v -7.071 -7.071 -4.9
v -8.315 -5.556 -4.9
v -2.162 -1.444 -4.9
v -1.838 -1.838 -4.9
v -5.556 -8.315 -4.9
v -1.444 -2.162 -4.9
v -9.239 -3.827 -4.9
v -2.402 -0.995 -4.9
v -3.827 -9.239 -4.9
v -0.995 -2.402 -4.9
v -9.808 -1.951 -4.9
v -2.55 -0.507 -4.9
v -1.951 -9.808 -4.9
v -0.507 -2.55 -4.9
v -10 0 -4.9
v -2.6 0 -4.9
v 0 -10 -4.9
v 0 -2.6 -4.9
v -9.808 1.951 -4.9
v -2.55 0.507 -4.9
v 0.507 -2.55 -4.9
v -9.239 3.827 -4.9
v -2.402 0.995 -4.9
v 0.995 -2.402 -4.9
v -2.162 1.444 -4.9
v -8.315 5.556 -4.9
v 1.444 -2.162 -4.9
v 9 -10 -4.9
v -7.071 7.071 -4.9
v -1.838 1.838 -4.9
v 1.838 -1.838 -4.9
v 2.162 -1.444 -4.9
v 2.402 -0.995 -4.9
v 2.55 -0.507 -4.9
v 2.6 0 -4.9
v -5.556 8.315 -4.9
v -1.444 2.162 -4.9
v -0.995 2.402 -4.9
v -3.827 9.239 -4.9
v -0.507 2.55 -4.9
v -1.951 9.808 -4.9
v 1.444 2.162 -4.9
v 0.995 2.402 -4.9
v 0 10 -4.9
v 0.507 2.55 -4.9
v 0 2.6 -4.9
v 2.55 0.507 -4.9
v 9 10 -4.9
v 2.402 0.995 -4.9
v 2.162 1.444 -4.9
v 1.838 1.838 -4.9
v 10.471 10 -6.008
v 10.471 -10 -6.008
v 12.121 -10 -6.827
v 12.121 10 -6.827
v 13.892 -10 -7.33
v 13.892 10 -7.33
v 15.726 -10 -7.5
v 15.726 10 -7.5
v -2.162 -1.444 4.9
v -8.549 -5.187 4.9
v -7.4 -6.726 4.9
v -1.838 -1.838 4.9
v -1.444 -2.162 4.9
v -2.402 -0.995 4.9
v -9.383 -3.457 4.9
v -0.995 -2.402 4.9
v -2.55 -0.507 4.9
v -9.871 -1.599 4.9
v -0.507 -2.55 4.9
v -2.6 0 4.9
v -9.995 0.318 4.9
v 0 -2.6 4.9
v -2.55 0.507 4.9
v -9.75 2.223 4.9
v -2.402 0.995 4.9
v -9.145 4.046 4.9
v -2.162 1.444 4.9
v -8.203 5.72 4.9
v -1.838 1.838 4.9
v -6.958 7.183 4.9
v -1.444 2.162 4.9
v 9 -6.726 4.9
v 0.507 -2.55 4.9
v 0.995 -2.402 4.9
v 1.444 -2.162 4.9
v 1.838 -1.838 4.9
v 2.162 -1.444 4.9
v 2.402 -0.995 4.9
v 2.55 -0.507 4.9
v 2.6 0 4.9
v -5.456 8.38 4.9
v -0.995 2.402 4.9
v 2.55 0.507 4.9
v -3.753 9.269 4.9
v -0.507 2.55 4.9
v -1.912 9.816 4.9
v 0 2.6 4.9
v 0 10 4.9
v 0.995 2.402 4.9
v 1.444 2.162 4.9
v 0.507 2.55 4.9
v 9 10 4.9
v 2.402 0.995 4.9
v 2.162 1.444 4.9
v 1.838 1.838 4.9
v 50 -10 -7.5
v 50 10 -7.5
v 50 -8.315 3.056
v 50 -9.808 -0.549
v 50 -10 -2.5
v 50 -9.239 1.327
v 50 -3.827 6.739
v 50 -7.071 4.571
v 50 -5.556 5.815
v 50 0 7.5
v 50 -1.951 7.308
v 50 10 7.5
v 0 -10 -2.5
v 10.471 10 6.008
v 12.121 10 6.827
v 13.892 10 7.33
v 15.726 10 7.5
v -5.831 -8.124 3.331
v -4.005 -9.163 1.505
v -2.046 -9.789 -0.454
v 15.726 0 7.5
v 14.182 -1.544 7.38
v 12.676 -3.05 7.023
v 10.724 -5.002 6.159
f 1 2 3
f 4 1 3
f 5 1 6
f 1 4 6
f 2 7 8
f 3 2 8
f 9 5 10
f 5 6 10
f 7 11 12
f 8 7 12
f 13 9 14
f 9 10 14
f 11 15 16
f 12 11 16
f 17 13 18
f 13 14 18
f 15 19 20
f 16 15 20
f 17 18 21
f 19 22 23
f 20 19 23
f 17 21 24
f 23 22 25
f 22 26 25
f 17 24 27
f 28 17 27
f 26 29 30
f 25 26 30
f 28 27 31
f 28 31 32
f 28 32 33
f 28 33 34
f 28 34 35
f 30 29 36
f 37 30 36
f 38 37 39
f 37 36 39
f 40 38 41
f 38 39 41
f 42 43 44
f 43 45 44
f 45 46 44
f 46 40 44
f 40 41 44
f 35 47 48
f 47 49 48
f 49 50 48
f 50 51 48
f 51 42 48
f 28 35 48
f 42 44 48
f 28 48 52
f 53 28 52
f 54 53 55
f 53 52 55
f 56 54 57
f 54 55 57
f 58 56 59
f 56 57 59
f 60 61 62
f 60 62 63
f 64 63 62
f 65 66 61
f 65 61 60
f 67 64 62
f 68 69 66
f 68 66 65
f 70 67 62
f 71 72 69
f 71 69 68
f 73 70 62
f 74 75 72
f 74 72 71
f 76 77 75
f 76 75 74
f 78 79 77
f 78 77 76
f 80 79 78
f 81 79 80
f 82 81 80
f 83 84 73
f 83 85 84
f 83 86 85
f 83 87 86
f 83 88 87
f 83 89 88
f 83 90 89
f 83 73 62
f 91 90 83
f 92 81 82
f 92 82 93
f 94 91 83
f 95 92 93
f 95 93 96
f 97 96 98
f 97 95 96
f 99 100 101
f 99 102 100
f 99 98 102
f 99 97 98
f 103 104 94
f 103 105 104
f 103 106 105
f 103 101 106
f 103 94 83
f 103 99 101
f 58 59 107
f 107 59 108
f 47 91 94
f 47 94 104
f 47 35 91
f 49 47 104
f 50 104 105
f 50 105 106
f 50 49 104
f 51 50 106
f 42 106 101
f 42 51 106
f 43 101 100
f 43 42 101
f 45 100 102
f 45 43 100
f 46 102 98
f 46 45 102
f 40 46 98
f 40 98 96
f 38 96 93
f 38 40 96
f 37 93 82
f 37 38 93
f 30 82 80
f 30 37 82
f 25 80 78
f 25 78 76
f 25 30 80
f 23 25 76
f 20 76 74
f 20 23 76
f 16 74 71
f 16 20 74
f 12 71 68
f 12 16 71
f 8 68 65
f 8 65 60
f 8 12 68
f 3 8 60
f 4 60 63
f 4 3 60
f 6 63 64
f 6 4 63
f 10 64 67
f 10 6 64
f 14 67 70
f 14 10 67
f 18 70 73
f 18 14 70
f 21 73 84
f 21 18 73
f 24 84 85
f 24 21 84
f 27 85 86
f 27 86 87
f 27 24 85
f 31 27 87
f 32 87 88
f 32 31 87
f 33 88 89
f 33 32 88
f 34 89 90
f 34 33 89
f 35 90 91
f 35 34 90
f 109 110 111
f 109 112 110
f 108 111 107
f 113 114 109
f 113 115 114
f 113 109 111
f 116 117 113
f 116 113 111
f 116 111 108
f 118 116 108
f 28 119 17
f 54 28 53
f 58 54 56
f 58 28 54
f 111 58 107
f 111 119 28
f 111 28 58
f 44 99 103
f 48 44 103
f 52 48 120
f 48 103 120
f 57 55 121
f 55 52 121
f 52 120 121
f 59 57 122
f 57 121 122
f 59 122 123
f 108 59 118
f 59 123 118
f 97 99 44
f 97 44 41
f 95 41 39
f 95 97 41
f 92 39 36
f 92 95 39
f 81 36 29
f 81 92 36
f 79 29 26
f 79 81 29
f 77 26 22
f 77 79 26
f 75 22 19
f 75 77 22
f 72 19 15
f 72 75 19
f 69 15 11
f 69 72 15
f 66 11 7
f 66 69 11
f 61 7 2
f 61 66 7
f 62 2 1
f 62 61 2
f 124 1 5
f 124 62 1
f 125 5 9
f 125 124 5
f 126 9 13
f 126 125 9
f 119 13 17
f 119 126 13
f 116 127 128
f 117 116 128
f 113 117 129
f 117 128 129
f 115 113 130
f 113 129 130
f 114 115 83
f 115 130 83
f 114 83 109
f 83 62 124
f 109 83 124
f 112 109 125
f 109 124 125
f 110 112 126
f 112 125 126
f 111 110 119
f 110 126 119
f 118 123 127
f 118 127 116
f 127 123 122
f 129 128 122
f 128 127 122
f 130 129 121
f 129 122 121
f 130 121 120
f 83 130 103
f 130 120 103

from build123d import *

# Parameters (mm, degrees)
SKETCH1_R           = 2.6
BOSS_EXTRUDE1_DEPTH = 4.9
SKETCH1_3_W         = 41
SKETCH1_3_H         = 20
BOSS_EXTRUDE2_DEPTH = 7.5
FILLET1_R           = 10


with BuildPart() as part:
    # Sketch1 → Boss-Extrude1 (new, symmetric)
    with BuildSketch(Plane.XY):
        with BuildLine():
            Line((9, 10), (0, 10))
            ThreePointArc((0, 10), (-10, 0), (0, -10))
            Line((0, -10), (9, -10))
            Line((9, -10), (9, 10))
        make_face()
        Circle(SKETCH1_R, mode=Mode.SUBTRACT)
    extrude(amount=BOSS_EXTRUDE1_DEPTH, both=True)

    # Sketch1<3> → Boss-Extrude2 (add, symmetric)
    with BuildSketch(Plane.XY):
        with Locations((29.5, 0)):
            Rectangle(SKETCH1_3_W, SKETCH1_3_H)
    extrude(amount=BOSS_EXTRUDE2_DEPTH, both=True)

    # Fillet1
    # the kernel refuses this fillet: 10 mm, written as the material it takes off along each edge
    with BuildSketch(Plane(origin=(-16, -10, 7.5), x_dir=(0, 0, -1), z_dir=(1, 0, 0))) as fillet1_piece_1:
        with BuildLine():
            CenterArc((FILLET1_R, FILLET1_R), FILLET1_R, 180, 90)
            Line((0, FILLET1_R), (-FILLET1_R * 0.02, FILLET1_R))
            Line((-FILLET1_R * 0.02, FILLET1_R), (-FILLET1_R * 0.02, -FILLET1_R * 0.02))
            Line((-FILLET1_R * 0.02, -FILLET1_R * 0.02), (FILLET1_R, -FILLET1_R * 0.02))
            Line((FILLET1_R, -FILLET1_R * 0.02), (FILLET1_R, 0))
        make_face()
    extrude(amount=91, mode=Mode.SUBTRACT)
    with BuildSketch(Plane(origin=(9, 26.815171721, -7.5), x_dir=(1, 0, 0), z_dir=(0, -1, 0))) as fillet1_piece_2:
        with BuildLine():
            CenterArc((6.726068688, 10), FILLET1_R, 227.73141557, 42.26858443)
            Line((0, 2.6), (-0.134521374, 2.452))
            ThreePointArc((-0.134521374, 2.452), (-0.2, 1.3), (-0.2, 0))
            Line((-0.2, 0), (0, -0.2))
            Line((0, -0.2), (6.726068688, -0.2))
            Line((6.726068688, -0.2), (6.726068688, 0))
        make_face()
    extrude(amount=53.630343442, mode=Mode.SUBTRACT)
    with BuildSketch(Plane(origin=(9, 26.815171721, 7.5), x_dir=(1, 0, 0), z_dir=(0, -1, 0))) as fillet1_piece_3:
        with BuildLine():
            CenterArc((6.726068688, -10), FILLET1_R, 90, 42.26858443)
            Line((0, -2.6), (-0.134521374, -2.452))
            ThreePointArc((-0.134521374, -2.452), (-0.2, -1.3), (-0.2, 0))
            Line((-0.2, 0), (0, 0.2))
            Line((0, 0.2), (6.726068688, 0.2))
            Line((6.726068688, 0.2), (6.726068688, 0))
        make_face()
    extrude(amount=53.630343442, mode=Mode.SUBTRACT)


solid = part.part
